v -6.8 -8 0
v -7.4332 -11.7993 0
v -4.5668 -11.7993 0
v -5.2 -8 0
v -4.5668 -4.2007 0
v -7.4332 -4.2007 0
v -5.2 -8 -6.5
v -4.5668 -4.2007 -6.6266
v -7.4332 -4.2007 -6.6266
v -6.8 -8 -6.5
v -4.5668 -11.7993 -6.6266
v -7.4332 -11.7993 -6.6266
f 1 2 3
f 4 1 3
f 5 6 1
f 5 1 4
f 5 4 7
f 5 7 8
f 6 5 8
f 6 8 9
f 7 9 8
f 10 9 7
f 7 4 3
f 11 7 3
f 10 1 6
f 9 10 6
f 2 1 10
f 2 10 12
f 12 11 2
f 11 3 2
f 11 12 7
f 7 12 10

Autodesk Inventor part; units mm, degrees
ref_plane "YZ Plane" through (0, 0, 0) normal (1, 0, 0) x (0, 1, 0)
ref_plane "XZ Plane" through (0, 0, 0) normal (0, 1, 0) x (-1, 0, 0)
sketch "Sketch1" plane through (0, 0, 0) normal (0, 0, 1) x (1, 0, 0)
  line L0 (10, -8) -> (-10, -8) projected
  line L1 (-7, -8) -> (-7.6667, -12)
  line L2 (-7.6667, -12) -> (-4.3333, -12)
  line L3 (-4.3333, -12) -> (-5, -8)
  line L4 (-6, -8) -> (-6.0726, -4.2007)
  line L5 (-6, -8) -> (-6.8, -8)
  line L6 (-6, -8) -> (-5.2, -8)
  line L7 (-6.8, -8) -> (-7.4332, -4.2007)
  line L8 (-7.4332, -4.2007) -> (-6.0726, -4.2007)
  line L9 (-5.2, -8) -> (-4.5668, -4.2007)
  line L10 (-4.5668, -4.2007) -> (-6.0726, -4.2007)
  line L11 (-6, -8) -> (-6.0726, -11.7993)
  line L12 (-6.8, -8) -> (-7.4332, -11.7993)
  line L13 (-7.4332, -11.7993) -> (-6.0726, -11.7993)
  line L14 (-5.2, -8) -> (-4.5668, -11.7993)
  line L15 (-4.5668, -11.7993) -> (-6.0726, -11.7993)
  line L16 (-7, -8) -> (-7.6667, -4)
  line L17 (-7.6667, -4) -> (-4.3333, -4)
  line L18 (-4.3333, -4) -> (-5, -8)
  point P0 (0, 0)
  point P1 (-8, -8)
  point P2 (-5.2, -8)
  dimension "d2" = 3.8
  dimension "d3" = 0.8
  dimension "d4" = 0.8
ref_plane "Work Plane1" through (-10, -8, -5.5) normal (0, 0, -1) x (0, 1, 0)
extrude "Extrusion1" add sketch "Sketch1" against normal blind 7 contours L14 L15 L11 L0 | L0 L4 L10 L9 | L11 L13 L12 L0 | L0 L7 L8 L4
ref_plane "Work Plane2" through (-10, -8, 0) normal (-1, 0, 0) x (0, 1, 0)
sketch "Sketch2" plane through (-10, -8, 0) normal (-1, 0, 0) x (0, 1, 0)
  line L0 (3.7993, 0) -> (3.7993, 7) projected
  line L1 (0, 0) -> (0, 7) projected
  line L2 (-3.7993, 0) -> (-3.7993, 7) projected
  line L3 (15, 7) -> (0, 6.5) projected
  line L4 (0, 7) -> (3.7993, 7) projected
  line L5 (3.7993, 7) -> (0, 7)
  line L6 (-3.7993, 0) -> (-3.7993, 7)
  line L7 (-15, 7) -> (0, 6.5)
  line L8 (0, 7) -> (-3.7993, 7)
  point P0 (8, 0)
  point P1 (-3.7993, 6.6266)
  point P2 (3.7993, 6.6266)
extrude "Extrusion2" cut sketch "Sketch2" against normal through all
properties part number "key_3DPrint"
